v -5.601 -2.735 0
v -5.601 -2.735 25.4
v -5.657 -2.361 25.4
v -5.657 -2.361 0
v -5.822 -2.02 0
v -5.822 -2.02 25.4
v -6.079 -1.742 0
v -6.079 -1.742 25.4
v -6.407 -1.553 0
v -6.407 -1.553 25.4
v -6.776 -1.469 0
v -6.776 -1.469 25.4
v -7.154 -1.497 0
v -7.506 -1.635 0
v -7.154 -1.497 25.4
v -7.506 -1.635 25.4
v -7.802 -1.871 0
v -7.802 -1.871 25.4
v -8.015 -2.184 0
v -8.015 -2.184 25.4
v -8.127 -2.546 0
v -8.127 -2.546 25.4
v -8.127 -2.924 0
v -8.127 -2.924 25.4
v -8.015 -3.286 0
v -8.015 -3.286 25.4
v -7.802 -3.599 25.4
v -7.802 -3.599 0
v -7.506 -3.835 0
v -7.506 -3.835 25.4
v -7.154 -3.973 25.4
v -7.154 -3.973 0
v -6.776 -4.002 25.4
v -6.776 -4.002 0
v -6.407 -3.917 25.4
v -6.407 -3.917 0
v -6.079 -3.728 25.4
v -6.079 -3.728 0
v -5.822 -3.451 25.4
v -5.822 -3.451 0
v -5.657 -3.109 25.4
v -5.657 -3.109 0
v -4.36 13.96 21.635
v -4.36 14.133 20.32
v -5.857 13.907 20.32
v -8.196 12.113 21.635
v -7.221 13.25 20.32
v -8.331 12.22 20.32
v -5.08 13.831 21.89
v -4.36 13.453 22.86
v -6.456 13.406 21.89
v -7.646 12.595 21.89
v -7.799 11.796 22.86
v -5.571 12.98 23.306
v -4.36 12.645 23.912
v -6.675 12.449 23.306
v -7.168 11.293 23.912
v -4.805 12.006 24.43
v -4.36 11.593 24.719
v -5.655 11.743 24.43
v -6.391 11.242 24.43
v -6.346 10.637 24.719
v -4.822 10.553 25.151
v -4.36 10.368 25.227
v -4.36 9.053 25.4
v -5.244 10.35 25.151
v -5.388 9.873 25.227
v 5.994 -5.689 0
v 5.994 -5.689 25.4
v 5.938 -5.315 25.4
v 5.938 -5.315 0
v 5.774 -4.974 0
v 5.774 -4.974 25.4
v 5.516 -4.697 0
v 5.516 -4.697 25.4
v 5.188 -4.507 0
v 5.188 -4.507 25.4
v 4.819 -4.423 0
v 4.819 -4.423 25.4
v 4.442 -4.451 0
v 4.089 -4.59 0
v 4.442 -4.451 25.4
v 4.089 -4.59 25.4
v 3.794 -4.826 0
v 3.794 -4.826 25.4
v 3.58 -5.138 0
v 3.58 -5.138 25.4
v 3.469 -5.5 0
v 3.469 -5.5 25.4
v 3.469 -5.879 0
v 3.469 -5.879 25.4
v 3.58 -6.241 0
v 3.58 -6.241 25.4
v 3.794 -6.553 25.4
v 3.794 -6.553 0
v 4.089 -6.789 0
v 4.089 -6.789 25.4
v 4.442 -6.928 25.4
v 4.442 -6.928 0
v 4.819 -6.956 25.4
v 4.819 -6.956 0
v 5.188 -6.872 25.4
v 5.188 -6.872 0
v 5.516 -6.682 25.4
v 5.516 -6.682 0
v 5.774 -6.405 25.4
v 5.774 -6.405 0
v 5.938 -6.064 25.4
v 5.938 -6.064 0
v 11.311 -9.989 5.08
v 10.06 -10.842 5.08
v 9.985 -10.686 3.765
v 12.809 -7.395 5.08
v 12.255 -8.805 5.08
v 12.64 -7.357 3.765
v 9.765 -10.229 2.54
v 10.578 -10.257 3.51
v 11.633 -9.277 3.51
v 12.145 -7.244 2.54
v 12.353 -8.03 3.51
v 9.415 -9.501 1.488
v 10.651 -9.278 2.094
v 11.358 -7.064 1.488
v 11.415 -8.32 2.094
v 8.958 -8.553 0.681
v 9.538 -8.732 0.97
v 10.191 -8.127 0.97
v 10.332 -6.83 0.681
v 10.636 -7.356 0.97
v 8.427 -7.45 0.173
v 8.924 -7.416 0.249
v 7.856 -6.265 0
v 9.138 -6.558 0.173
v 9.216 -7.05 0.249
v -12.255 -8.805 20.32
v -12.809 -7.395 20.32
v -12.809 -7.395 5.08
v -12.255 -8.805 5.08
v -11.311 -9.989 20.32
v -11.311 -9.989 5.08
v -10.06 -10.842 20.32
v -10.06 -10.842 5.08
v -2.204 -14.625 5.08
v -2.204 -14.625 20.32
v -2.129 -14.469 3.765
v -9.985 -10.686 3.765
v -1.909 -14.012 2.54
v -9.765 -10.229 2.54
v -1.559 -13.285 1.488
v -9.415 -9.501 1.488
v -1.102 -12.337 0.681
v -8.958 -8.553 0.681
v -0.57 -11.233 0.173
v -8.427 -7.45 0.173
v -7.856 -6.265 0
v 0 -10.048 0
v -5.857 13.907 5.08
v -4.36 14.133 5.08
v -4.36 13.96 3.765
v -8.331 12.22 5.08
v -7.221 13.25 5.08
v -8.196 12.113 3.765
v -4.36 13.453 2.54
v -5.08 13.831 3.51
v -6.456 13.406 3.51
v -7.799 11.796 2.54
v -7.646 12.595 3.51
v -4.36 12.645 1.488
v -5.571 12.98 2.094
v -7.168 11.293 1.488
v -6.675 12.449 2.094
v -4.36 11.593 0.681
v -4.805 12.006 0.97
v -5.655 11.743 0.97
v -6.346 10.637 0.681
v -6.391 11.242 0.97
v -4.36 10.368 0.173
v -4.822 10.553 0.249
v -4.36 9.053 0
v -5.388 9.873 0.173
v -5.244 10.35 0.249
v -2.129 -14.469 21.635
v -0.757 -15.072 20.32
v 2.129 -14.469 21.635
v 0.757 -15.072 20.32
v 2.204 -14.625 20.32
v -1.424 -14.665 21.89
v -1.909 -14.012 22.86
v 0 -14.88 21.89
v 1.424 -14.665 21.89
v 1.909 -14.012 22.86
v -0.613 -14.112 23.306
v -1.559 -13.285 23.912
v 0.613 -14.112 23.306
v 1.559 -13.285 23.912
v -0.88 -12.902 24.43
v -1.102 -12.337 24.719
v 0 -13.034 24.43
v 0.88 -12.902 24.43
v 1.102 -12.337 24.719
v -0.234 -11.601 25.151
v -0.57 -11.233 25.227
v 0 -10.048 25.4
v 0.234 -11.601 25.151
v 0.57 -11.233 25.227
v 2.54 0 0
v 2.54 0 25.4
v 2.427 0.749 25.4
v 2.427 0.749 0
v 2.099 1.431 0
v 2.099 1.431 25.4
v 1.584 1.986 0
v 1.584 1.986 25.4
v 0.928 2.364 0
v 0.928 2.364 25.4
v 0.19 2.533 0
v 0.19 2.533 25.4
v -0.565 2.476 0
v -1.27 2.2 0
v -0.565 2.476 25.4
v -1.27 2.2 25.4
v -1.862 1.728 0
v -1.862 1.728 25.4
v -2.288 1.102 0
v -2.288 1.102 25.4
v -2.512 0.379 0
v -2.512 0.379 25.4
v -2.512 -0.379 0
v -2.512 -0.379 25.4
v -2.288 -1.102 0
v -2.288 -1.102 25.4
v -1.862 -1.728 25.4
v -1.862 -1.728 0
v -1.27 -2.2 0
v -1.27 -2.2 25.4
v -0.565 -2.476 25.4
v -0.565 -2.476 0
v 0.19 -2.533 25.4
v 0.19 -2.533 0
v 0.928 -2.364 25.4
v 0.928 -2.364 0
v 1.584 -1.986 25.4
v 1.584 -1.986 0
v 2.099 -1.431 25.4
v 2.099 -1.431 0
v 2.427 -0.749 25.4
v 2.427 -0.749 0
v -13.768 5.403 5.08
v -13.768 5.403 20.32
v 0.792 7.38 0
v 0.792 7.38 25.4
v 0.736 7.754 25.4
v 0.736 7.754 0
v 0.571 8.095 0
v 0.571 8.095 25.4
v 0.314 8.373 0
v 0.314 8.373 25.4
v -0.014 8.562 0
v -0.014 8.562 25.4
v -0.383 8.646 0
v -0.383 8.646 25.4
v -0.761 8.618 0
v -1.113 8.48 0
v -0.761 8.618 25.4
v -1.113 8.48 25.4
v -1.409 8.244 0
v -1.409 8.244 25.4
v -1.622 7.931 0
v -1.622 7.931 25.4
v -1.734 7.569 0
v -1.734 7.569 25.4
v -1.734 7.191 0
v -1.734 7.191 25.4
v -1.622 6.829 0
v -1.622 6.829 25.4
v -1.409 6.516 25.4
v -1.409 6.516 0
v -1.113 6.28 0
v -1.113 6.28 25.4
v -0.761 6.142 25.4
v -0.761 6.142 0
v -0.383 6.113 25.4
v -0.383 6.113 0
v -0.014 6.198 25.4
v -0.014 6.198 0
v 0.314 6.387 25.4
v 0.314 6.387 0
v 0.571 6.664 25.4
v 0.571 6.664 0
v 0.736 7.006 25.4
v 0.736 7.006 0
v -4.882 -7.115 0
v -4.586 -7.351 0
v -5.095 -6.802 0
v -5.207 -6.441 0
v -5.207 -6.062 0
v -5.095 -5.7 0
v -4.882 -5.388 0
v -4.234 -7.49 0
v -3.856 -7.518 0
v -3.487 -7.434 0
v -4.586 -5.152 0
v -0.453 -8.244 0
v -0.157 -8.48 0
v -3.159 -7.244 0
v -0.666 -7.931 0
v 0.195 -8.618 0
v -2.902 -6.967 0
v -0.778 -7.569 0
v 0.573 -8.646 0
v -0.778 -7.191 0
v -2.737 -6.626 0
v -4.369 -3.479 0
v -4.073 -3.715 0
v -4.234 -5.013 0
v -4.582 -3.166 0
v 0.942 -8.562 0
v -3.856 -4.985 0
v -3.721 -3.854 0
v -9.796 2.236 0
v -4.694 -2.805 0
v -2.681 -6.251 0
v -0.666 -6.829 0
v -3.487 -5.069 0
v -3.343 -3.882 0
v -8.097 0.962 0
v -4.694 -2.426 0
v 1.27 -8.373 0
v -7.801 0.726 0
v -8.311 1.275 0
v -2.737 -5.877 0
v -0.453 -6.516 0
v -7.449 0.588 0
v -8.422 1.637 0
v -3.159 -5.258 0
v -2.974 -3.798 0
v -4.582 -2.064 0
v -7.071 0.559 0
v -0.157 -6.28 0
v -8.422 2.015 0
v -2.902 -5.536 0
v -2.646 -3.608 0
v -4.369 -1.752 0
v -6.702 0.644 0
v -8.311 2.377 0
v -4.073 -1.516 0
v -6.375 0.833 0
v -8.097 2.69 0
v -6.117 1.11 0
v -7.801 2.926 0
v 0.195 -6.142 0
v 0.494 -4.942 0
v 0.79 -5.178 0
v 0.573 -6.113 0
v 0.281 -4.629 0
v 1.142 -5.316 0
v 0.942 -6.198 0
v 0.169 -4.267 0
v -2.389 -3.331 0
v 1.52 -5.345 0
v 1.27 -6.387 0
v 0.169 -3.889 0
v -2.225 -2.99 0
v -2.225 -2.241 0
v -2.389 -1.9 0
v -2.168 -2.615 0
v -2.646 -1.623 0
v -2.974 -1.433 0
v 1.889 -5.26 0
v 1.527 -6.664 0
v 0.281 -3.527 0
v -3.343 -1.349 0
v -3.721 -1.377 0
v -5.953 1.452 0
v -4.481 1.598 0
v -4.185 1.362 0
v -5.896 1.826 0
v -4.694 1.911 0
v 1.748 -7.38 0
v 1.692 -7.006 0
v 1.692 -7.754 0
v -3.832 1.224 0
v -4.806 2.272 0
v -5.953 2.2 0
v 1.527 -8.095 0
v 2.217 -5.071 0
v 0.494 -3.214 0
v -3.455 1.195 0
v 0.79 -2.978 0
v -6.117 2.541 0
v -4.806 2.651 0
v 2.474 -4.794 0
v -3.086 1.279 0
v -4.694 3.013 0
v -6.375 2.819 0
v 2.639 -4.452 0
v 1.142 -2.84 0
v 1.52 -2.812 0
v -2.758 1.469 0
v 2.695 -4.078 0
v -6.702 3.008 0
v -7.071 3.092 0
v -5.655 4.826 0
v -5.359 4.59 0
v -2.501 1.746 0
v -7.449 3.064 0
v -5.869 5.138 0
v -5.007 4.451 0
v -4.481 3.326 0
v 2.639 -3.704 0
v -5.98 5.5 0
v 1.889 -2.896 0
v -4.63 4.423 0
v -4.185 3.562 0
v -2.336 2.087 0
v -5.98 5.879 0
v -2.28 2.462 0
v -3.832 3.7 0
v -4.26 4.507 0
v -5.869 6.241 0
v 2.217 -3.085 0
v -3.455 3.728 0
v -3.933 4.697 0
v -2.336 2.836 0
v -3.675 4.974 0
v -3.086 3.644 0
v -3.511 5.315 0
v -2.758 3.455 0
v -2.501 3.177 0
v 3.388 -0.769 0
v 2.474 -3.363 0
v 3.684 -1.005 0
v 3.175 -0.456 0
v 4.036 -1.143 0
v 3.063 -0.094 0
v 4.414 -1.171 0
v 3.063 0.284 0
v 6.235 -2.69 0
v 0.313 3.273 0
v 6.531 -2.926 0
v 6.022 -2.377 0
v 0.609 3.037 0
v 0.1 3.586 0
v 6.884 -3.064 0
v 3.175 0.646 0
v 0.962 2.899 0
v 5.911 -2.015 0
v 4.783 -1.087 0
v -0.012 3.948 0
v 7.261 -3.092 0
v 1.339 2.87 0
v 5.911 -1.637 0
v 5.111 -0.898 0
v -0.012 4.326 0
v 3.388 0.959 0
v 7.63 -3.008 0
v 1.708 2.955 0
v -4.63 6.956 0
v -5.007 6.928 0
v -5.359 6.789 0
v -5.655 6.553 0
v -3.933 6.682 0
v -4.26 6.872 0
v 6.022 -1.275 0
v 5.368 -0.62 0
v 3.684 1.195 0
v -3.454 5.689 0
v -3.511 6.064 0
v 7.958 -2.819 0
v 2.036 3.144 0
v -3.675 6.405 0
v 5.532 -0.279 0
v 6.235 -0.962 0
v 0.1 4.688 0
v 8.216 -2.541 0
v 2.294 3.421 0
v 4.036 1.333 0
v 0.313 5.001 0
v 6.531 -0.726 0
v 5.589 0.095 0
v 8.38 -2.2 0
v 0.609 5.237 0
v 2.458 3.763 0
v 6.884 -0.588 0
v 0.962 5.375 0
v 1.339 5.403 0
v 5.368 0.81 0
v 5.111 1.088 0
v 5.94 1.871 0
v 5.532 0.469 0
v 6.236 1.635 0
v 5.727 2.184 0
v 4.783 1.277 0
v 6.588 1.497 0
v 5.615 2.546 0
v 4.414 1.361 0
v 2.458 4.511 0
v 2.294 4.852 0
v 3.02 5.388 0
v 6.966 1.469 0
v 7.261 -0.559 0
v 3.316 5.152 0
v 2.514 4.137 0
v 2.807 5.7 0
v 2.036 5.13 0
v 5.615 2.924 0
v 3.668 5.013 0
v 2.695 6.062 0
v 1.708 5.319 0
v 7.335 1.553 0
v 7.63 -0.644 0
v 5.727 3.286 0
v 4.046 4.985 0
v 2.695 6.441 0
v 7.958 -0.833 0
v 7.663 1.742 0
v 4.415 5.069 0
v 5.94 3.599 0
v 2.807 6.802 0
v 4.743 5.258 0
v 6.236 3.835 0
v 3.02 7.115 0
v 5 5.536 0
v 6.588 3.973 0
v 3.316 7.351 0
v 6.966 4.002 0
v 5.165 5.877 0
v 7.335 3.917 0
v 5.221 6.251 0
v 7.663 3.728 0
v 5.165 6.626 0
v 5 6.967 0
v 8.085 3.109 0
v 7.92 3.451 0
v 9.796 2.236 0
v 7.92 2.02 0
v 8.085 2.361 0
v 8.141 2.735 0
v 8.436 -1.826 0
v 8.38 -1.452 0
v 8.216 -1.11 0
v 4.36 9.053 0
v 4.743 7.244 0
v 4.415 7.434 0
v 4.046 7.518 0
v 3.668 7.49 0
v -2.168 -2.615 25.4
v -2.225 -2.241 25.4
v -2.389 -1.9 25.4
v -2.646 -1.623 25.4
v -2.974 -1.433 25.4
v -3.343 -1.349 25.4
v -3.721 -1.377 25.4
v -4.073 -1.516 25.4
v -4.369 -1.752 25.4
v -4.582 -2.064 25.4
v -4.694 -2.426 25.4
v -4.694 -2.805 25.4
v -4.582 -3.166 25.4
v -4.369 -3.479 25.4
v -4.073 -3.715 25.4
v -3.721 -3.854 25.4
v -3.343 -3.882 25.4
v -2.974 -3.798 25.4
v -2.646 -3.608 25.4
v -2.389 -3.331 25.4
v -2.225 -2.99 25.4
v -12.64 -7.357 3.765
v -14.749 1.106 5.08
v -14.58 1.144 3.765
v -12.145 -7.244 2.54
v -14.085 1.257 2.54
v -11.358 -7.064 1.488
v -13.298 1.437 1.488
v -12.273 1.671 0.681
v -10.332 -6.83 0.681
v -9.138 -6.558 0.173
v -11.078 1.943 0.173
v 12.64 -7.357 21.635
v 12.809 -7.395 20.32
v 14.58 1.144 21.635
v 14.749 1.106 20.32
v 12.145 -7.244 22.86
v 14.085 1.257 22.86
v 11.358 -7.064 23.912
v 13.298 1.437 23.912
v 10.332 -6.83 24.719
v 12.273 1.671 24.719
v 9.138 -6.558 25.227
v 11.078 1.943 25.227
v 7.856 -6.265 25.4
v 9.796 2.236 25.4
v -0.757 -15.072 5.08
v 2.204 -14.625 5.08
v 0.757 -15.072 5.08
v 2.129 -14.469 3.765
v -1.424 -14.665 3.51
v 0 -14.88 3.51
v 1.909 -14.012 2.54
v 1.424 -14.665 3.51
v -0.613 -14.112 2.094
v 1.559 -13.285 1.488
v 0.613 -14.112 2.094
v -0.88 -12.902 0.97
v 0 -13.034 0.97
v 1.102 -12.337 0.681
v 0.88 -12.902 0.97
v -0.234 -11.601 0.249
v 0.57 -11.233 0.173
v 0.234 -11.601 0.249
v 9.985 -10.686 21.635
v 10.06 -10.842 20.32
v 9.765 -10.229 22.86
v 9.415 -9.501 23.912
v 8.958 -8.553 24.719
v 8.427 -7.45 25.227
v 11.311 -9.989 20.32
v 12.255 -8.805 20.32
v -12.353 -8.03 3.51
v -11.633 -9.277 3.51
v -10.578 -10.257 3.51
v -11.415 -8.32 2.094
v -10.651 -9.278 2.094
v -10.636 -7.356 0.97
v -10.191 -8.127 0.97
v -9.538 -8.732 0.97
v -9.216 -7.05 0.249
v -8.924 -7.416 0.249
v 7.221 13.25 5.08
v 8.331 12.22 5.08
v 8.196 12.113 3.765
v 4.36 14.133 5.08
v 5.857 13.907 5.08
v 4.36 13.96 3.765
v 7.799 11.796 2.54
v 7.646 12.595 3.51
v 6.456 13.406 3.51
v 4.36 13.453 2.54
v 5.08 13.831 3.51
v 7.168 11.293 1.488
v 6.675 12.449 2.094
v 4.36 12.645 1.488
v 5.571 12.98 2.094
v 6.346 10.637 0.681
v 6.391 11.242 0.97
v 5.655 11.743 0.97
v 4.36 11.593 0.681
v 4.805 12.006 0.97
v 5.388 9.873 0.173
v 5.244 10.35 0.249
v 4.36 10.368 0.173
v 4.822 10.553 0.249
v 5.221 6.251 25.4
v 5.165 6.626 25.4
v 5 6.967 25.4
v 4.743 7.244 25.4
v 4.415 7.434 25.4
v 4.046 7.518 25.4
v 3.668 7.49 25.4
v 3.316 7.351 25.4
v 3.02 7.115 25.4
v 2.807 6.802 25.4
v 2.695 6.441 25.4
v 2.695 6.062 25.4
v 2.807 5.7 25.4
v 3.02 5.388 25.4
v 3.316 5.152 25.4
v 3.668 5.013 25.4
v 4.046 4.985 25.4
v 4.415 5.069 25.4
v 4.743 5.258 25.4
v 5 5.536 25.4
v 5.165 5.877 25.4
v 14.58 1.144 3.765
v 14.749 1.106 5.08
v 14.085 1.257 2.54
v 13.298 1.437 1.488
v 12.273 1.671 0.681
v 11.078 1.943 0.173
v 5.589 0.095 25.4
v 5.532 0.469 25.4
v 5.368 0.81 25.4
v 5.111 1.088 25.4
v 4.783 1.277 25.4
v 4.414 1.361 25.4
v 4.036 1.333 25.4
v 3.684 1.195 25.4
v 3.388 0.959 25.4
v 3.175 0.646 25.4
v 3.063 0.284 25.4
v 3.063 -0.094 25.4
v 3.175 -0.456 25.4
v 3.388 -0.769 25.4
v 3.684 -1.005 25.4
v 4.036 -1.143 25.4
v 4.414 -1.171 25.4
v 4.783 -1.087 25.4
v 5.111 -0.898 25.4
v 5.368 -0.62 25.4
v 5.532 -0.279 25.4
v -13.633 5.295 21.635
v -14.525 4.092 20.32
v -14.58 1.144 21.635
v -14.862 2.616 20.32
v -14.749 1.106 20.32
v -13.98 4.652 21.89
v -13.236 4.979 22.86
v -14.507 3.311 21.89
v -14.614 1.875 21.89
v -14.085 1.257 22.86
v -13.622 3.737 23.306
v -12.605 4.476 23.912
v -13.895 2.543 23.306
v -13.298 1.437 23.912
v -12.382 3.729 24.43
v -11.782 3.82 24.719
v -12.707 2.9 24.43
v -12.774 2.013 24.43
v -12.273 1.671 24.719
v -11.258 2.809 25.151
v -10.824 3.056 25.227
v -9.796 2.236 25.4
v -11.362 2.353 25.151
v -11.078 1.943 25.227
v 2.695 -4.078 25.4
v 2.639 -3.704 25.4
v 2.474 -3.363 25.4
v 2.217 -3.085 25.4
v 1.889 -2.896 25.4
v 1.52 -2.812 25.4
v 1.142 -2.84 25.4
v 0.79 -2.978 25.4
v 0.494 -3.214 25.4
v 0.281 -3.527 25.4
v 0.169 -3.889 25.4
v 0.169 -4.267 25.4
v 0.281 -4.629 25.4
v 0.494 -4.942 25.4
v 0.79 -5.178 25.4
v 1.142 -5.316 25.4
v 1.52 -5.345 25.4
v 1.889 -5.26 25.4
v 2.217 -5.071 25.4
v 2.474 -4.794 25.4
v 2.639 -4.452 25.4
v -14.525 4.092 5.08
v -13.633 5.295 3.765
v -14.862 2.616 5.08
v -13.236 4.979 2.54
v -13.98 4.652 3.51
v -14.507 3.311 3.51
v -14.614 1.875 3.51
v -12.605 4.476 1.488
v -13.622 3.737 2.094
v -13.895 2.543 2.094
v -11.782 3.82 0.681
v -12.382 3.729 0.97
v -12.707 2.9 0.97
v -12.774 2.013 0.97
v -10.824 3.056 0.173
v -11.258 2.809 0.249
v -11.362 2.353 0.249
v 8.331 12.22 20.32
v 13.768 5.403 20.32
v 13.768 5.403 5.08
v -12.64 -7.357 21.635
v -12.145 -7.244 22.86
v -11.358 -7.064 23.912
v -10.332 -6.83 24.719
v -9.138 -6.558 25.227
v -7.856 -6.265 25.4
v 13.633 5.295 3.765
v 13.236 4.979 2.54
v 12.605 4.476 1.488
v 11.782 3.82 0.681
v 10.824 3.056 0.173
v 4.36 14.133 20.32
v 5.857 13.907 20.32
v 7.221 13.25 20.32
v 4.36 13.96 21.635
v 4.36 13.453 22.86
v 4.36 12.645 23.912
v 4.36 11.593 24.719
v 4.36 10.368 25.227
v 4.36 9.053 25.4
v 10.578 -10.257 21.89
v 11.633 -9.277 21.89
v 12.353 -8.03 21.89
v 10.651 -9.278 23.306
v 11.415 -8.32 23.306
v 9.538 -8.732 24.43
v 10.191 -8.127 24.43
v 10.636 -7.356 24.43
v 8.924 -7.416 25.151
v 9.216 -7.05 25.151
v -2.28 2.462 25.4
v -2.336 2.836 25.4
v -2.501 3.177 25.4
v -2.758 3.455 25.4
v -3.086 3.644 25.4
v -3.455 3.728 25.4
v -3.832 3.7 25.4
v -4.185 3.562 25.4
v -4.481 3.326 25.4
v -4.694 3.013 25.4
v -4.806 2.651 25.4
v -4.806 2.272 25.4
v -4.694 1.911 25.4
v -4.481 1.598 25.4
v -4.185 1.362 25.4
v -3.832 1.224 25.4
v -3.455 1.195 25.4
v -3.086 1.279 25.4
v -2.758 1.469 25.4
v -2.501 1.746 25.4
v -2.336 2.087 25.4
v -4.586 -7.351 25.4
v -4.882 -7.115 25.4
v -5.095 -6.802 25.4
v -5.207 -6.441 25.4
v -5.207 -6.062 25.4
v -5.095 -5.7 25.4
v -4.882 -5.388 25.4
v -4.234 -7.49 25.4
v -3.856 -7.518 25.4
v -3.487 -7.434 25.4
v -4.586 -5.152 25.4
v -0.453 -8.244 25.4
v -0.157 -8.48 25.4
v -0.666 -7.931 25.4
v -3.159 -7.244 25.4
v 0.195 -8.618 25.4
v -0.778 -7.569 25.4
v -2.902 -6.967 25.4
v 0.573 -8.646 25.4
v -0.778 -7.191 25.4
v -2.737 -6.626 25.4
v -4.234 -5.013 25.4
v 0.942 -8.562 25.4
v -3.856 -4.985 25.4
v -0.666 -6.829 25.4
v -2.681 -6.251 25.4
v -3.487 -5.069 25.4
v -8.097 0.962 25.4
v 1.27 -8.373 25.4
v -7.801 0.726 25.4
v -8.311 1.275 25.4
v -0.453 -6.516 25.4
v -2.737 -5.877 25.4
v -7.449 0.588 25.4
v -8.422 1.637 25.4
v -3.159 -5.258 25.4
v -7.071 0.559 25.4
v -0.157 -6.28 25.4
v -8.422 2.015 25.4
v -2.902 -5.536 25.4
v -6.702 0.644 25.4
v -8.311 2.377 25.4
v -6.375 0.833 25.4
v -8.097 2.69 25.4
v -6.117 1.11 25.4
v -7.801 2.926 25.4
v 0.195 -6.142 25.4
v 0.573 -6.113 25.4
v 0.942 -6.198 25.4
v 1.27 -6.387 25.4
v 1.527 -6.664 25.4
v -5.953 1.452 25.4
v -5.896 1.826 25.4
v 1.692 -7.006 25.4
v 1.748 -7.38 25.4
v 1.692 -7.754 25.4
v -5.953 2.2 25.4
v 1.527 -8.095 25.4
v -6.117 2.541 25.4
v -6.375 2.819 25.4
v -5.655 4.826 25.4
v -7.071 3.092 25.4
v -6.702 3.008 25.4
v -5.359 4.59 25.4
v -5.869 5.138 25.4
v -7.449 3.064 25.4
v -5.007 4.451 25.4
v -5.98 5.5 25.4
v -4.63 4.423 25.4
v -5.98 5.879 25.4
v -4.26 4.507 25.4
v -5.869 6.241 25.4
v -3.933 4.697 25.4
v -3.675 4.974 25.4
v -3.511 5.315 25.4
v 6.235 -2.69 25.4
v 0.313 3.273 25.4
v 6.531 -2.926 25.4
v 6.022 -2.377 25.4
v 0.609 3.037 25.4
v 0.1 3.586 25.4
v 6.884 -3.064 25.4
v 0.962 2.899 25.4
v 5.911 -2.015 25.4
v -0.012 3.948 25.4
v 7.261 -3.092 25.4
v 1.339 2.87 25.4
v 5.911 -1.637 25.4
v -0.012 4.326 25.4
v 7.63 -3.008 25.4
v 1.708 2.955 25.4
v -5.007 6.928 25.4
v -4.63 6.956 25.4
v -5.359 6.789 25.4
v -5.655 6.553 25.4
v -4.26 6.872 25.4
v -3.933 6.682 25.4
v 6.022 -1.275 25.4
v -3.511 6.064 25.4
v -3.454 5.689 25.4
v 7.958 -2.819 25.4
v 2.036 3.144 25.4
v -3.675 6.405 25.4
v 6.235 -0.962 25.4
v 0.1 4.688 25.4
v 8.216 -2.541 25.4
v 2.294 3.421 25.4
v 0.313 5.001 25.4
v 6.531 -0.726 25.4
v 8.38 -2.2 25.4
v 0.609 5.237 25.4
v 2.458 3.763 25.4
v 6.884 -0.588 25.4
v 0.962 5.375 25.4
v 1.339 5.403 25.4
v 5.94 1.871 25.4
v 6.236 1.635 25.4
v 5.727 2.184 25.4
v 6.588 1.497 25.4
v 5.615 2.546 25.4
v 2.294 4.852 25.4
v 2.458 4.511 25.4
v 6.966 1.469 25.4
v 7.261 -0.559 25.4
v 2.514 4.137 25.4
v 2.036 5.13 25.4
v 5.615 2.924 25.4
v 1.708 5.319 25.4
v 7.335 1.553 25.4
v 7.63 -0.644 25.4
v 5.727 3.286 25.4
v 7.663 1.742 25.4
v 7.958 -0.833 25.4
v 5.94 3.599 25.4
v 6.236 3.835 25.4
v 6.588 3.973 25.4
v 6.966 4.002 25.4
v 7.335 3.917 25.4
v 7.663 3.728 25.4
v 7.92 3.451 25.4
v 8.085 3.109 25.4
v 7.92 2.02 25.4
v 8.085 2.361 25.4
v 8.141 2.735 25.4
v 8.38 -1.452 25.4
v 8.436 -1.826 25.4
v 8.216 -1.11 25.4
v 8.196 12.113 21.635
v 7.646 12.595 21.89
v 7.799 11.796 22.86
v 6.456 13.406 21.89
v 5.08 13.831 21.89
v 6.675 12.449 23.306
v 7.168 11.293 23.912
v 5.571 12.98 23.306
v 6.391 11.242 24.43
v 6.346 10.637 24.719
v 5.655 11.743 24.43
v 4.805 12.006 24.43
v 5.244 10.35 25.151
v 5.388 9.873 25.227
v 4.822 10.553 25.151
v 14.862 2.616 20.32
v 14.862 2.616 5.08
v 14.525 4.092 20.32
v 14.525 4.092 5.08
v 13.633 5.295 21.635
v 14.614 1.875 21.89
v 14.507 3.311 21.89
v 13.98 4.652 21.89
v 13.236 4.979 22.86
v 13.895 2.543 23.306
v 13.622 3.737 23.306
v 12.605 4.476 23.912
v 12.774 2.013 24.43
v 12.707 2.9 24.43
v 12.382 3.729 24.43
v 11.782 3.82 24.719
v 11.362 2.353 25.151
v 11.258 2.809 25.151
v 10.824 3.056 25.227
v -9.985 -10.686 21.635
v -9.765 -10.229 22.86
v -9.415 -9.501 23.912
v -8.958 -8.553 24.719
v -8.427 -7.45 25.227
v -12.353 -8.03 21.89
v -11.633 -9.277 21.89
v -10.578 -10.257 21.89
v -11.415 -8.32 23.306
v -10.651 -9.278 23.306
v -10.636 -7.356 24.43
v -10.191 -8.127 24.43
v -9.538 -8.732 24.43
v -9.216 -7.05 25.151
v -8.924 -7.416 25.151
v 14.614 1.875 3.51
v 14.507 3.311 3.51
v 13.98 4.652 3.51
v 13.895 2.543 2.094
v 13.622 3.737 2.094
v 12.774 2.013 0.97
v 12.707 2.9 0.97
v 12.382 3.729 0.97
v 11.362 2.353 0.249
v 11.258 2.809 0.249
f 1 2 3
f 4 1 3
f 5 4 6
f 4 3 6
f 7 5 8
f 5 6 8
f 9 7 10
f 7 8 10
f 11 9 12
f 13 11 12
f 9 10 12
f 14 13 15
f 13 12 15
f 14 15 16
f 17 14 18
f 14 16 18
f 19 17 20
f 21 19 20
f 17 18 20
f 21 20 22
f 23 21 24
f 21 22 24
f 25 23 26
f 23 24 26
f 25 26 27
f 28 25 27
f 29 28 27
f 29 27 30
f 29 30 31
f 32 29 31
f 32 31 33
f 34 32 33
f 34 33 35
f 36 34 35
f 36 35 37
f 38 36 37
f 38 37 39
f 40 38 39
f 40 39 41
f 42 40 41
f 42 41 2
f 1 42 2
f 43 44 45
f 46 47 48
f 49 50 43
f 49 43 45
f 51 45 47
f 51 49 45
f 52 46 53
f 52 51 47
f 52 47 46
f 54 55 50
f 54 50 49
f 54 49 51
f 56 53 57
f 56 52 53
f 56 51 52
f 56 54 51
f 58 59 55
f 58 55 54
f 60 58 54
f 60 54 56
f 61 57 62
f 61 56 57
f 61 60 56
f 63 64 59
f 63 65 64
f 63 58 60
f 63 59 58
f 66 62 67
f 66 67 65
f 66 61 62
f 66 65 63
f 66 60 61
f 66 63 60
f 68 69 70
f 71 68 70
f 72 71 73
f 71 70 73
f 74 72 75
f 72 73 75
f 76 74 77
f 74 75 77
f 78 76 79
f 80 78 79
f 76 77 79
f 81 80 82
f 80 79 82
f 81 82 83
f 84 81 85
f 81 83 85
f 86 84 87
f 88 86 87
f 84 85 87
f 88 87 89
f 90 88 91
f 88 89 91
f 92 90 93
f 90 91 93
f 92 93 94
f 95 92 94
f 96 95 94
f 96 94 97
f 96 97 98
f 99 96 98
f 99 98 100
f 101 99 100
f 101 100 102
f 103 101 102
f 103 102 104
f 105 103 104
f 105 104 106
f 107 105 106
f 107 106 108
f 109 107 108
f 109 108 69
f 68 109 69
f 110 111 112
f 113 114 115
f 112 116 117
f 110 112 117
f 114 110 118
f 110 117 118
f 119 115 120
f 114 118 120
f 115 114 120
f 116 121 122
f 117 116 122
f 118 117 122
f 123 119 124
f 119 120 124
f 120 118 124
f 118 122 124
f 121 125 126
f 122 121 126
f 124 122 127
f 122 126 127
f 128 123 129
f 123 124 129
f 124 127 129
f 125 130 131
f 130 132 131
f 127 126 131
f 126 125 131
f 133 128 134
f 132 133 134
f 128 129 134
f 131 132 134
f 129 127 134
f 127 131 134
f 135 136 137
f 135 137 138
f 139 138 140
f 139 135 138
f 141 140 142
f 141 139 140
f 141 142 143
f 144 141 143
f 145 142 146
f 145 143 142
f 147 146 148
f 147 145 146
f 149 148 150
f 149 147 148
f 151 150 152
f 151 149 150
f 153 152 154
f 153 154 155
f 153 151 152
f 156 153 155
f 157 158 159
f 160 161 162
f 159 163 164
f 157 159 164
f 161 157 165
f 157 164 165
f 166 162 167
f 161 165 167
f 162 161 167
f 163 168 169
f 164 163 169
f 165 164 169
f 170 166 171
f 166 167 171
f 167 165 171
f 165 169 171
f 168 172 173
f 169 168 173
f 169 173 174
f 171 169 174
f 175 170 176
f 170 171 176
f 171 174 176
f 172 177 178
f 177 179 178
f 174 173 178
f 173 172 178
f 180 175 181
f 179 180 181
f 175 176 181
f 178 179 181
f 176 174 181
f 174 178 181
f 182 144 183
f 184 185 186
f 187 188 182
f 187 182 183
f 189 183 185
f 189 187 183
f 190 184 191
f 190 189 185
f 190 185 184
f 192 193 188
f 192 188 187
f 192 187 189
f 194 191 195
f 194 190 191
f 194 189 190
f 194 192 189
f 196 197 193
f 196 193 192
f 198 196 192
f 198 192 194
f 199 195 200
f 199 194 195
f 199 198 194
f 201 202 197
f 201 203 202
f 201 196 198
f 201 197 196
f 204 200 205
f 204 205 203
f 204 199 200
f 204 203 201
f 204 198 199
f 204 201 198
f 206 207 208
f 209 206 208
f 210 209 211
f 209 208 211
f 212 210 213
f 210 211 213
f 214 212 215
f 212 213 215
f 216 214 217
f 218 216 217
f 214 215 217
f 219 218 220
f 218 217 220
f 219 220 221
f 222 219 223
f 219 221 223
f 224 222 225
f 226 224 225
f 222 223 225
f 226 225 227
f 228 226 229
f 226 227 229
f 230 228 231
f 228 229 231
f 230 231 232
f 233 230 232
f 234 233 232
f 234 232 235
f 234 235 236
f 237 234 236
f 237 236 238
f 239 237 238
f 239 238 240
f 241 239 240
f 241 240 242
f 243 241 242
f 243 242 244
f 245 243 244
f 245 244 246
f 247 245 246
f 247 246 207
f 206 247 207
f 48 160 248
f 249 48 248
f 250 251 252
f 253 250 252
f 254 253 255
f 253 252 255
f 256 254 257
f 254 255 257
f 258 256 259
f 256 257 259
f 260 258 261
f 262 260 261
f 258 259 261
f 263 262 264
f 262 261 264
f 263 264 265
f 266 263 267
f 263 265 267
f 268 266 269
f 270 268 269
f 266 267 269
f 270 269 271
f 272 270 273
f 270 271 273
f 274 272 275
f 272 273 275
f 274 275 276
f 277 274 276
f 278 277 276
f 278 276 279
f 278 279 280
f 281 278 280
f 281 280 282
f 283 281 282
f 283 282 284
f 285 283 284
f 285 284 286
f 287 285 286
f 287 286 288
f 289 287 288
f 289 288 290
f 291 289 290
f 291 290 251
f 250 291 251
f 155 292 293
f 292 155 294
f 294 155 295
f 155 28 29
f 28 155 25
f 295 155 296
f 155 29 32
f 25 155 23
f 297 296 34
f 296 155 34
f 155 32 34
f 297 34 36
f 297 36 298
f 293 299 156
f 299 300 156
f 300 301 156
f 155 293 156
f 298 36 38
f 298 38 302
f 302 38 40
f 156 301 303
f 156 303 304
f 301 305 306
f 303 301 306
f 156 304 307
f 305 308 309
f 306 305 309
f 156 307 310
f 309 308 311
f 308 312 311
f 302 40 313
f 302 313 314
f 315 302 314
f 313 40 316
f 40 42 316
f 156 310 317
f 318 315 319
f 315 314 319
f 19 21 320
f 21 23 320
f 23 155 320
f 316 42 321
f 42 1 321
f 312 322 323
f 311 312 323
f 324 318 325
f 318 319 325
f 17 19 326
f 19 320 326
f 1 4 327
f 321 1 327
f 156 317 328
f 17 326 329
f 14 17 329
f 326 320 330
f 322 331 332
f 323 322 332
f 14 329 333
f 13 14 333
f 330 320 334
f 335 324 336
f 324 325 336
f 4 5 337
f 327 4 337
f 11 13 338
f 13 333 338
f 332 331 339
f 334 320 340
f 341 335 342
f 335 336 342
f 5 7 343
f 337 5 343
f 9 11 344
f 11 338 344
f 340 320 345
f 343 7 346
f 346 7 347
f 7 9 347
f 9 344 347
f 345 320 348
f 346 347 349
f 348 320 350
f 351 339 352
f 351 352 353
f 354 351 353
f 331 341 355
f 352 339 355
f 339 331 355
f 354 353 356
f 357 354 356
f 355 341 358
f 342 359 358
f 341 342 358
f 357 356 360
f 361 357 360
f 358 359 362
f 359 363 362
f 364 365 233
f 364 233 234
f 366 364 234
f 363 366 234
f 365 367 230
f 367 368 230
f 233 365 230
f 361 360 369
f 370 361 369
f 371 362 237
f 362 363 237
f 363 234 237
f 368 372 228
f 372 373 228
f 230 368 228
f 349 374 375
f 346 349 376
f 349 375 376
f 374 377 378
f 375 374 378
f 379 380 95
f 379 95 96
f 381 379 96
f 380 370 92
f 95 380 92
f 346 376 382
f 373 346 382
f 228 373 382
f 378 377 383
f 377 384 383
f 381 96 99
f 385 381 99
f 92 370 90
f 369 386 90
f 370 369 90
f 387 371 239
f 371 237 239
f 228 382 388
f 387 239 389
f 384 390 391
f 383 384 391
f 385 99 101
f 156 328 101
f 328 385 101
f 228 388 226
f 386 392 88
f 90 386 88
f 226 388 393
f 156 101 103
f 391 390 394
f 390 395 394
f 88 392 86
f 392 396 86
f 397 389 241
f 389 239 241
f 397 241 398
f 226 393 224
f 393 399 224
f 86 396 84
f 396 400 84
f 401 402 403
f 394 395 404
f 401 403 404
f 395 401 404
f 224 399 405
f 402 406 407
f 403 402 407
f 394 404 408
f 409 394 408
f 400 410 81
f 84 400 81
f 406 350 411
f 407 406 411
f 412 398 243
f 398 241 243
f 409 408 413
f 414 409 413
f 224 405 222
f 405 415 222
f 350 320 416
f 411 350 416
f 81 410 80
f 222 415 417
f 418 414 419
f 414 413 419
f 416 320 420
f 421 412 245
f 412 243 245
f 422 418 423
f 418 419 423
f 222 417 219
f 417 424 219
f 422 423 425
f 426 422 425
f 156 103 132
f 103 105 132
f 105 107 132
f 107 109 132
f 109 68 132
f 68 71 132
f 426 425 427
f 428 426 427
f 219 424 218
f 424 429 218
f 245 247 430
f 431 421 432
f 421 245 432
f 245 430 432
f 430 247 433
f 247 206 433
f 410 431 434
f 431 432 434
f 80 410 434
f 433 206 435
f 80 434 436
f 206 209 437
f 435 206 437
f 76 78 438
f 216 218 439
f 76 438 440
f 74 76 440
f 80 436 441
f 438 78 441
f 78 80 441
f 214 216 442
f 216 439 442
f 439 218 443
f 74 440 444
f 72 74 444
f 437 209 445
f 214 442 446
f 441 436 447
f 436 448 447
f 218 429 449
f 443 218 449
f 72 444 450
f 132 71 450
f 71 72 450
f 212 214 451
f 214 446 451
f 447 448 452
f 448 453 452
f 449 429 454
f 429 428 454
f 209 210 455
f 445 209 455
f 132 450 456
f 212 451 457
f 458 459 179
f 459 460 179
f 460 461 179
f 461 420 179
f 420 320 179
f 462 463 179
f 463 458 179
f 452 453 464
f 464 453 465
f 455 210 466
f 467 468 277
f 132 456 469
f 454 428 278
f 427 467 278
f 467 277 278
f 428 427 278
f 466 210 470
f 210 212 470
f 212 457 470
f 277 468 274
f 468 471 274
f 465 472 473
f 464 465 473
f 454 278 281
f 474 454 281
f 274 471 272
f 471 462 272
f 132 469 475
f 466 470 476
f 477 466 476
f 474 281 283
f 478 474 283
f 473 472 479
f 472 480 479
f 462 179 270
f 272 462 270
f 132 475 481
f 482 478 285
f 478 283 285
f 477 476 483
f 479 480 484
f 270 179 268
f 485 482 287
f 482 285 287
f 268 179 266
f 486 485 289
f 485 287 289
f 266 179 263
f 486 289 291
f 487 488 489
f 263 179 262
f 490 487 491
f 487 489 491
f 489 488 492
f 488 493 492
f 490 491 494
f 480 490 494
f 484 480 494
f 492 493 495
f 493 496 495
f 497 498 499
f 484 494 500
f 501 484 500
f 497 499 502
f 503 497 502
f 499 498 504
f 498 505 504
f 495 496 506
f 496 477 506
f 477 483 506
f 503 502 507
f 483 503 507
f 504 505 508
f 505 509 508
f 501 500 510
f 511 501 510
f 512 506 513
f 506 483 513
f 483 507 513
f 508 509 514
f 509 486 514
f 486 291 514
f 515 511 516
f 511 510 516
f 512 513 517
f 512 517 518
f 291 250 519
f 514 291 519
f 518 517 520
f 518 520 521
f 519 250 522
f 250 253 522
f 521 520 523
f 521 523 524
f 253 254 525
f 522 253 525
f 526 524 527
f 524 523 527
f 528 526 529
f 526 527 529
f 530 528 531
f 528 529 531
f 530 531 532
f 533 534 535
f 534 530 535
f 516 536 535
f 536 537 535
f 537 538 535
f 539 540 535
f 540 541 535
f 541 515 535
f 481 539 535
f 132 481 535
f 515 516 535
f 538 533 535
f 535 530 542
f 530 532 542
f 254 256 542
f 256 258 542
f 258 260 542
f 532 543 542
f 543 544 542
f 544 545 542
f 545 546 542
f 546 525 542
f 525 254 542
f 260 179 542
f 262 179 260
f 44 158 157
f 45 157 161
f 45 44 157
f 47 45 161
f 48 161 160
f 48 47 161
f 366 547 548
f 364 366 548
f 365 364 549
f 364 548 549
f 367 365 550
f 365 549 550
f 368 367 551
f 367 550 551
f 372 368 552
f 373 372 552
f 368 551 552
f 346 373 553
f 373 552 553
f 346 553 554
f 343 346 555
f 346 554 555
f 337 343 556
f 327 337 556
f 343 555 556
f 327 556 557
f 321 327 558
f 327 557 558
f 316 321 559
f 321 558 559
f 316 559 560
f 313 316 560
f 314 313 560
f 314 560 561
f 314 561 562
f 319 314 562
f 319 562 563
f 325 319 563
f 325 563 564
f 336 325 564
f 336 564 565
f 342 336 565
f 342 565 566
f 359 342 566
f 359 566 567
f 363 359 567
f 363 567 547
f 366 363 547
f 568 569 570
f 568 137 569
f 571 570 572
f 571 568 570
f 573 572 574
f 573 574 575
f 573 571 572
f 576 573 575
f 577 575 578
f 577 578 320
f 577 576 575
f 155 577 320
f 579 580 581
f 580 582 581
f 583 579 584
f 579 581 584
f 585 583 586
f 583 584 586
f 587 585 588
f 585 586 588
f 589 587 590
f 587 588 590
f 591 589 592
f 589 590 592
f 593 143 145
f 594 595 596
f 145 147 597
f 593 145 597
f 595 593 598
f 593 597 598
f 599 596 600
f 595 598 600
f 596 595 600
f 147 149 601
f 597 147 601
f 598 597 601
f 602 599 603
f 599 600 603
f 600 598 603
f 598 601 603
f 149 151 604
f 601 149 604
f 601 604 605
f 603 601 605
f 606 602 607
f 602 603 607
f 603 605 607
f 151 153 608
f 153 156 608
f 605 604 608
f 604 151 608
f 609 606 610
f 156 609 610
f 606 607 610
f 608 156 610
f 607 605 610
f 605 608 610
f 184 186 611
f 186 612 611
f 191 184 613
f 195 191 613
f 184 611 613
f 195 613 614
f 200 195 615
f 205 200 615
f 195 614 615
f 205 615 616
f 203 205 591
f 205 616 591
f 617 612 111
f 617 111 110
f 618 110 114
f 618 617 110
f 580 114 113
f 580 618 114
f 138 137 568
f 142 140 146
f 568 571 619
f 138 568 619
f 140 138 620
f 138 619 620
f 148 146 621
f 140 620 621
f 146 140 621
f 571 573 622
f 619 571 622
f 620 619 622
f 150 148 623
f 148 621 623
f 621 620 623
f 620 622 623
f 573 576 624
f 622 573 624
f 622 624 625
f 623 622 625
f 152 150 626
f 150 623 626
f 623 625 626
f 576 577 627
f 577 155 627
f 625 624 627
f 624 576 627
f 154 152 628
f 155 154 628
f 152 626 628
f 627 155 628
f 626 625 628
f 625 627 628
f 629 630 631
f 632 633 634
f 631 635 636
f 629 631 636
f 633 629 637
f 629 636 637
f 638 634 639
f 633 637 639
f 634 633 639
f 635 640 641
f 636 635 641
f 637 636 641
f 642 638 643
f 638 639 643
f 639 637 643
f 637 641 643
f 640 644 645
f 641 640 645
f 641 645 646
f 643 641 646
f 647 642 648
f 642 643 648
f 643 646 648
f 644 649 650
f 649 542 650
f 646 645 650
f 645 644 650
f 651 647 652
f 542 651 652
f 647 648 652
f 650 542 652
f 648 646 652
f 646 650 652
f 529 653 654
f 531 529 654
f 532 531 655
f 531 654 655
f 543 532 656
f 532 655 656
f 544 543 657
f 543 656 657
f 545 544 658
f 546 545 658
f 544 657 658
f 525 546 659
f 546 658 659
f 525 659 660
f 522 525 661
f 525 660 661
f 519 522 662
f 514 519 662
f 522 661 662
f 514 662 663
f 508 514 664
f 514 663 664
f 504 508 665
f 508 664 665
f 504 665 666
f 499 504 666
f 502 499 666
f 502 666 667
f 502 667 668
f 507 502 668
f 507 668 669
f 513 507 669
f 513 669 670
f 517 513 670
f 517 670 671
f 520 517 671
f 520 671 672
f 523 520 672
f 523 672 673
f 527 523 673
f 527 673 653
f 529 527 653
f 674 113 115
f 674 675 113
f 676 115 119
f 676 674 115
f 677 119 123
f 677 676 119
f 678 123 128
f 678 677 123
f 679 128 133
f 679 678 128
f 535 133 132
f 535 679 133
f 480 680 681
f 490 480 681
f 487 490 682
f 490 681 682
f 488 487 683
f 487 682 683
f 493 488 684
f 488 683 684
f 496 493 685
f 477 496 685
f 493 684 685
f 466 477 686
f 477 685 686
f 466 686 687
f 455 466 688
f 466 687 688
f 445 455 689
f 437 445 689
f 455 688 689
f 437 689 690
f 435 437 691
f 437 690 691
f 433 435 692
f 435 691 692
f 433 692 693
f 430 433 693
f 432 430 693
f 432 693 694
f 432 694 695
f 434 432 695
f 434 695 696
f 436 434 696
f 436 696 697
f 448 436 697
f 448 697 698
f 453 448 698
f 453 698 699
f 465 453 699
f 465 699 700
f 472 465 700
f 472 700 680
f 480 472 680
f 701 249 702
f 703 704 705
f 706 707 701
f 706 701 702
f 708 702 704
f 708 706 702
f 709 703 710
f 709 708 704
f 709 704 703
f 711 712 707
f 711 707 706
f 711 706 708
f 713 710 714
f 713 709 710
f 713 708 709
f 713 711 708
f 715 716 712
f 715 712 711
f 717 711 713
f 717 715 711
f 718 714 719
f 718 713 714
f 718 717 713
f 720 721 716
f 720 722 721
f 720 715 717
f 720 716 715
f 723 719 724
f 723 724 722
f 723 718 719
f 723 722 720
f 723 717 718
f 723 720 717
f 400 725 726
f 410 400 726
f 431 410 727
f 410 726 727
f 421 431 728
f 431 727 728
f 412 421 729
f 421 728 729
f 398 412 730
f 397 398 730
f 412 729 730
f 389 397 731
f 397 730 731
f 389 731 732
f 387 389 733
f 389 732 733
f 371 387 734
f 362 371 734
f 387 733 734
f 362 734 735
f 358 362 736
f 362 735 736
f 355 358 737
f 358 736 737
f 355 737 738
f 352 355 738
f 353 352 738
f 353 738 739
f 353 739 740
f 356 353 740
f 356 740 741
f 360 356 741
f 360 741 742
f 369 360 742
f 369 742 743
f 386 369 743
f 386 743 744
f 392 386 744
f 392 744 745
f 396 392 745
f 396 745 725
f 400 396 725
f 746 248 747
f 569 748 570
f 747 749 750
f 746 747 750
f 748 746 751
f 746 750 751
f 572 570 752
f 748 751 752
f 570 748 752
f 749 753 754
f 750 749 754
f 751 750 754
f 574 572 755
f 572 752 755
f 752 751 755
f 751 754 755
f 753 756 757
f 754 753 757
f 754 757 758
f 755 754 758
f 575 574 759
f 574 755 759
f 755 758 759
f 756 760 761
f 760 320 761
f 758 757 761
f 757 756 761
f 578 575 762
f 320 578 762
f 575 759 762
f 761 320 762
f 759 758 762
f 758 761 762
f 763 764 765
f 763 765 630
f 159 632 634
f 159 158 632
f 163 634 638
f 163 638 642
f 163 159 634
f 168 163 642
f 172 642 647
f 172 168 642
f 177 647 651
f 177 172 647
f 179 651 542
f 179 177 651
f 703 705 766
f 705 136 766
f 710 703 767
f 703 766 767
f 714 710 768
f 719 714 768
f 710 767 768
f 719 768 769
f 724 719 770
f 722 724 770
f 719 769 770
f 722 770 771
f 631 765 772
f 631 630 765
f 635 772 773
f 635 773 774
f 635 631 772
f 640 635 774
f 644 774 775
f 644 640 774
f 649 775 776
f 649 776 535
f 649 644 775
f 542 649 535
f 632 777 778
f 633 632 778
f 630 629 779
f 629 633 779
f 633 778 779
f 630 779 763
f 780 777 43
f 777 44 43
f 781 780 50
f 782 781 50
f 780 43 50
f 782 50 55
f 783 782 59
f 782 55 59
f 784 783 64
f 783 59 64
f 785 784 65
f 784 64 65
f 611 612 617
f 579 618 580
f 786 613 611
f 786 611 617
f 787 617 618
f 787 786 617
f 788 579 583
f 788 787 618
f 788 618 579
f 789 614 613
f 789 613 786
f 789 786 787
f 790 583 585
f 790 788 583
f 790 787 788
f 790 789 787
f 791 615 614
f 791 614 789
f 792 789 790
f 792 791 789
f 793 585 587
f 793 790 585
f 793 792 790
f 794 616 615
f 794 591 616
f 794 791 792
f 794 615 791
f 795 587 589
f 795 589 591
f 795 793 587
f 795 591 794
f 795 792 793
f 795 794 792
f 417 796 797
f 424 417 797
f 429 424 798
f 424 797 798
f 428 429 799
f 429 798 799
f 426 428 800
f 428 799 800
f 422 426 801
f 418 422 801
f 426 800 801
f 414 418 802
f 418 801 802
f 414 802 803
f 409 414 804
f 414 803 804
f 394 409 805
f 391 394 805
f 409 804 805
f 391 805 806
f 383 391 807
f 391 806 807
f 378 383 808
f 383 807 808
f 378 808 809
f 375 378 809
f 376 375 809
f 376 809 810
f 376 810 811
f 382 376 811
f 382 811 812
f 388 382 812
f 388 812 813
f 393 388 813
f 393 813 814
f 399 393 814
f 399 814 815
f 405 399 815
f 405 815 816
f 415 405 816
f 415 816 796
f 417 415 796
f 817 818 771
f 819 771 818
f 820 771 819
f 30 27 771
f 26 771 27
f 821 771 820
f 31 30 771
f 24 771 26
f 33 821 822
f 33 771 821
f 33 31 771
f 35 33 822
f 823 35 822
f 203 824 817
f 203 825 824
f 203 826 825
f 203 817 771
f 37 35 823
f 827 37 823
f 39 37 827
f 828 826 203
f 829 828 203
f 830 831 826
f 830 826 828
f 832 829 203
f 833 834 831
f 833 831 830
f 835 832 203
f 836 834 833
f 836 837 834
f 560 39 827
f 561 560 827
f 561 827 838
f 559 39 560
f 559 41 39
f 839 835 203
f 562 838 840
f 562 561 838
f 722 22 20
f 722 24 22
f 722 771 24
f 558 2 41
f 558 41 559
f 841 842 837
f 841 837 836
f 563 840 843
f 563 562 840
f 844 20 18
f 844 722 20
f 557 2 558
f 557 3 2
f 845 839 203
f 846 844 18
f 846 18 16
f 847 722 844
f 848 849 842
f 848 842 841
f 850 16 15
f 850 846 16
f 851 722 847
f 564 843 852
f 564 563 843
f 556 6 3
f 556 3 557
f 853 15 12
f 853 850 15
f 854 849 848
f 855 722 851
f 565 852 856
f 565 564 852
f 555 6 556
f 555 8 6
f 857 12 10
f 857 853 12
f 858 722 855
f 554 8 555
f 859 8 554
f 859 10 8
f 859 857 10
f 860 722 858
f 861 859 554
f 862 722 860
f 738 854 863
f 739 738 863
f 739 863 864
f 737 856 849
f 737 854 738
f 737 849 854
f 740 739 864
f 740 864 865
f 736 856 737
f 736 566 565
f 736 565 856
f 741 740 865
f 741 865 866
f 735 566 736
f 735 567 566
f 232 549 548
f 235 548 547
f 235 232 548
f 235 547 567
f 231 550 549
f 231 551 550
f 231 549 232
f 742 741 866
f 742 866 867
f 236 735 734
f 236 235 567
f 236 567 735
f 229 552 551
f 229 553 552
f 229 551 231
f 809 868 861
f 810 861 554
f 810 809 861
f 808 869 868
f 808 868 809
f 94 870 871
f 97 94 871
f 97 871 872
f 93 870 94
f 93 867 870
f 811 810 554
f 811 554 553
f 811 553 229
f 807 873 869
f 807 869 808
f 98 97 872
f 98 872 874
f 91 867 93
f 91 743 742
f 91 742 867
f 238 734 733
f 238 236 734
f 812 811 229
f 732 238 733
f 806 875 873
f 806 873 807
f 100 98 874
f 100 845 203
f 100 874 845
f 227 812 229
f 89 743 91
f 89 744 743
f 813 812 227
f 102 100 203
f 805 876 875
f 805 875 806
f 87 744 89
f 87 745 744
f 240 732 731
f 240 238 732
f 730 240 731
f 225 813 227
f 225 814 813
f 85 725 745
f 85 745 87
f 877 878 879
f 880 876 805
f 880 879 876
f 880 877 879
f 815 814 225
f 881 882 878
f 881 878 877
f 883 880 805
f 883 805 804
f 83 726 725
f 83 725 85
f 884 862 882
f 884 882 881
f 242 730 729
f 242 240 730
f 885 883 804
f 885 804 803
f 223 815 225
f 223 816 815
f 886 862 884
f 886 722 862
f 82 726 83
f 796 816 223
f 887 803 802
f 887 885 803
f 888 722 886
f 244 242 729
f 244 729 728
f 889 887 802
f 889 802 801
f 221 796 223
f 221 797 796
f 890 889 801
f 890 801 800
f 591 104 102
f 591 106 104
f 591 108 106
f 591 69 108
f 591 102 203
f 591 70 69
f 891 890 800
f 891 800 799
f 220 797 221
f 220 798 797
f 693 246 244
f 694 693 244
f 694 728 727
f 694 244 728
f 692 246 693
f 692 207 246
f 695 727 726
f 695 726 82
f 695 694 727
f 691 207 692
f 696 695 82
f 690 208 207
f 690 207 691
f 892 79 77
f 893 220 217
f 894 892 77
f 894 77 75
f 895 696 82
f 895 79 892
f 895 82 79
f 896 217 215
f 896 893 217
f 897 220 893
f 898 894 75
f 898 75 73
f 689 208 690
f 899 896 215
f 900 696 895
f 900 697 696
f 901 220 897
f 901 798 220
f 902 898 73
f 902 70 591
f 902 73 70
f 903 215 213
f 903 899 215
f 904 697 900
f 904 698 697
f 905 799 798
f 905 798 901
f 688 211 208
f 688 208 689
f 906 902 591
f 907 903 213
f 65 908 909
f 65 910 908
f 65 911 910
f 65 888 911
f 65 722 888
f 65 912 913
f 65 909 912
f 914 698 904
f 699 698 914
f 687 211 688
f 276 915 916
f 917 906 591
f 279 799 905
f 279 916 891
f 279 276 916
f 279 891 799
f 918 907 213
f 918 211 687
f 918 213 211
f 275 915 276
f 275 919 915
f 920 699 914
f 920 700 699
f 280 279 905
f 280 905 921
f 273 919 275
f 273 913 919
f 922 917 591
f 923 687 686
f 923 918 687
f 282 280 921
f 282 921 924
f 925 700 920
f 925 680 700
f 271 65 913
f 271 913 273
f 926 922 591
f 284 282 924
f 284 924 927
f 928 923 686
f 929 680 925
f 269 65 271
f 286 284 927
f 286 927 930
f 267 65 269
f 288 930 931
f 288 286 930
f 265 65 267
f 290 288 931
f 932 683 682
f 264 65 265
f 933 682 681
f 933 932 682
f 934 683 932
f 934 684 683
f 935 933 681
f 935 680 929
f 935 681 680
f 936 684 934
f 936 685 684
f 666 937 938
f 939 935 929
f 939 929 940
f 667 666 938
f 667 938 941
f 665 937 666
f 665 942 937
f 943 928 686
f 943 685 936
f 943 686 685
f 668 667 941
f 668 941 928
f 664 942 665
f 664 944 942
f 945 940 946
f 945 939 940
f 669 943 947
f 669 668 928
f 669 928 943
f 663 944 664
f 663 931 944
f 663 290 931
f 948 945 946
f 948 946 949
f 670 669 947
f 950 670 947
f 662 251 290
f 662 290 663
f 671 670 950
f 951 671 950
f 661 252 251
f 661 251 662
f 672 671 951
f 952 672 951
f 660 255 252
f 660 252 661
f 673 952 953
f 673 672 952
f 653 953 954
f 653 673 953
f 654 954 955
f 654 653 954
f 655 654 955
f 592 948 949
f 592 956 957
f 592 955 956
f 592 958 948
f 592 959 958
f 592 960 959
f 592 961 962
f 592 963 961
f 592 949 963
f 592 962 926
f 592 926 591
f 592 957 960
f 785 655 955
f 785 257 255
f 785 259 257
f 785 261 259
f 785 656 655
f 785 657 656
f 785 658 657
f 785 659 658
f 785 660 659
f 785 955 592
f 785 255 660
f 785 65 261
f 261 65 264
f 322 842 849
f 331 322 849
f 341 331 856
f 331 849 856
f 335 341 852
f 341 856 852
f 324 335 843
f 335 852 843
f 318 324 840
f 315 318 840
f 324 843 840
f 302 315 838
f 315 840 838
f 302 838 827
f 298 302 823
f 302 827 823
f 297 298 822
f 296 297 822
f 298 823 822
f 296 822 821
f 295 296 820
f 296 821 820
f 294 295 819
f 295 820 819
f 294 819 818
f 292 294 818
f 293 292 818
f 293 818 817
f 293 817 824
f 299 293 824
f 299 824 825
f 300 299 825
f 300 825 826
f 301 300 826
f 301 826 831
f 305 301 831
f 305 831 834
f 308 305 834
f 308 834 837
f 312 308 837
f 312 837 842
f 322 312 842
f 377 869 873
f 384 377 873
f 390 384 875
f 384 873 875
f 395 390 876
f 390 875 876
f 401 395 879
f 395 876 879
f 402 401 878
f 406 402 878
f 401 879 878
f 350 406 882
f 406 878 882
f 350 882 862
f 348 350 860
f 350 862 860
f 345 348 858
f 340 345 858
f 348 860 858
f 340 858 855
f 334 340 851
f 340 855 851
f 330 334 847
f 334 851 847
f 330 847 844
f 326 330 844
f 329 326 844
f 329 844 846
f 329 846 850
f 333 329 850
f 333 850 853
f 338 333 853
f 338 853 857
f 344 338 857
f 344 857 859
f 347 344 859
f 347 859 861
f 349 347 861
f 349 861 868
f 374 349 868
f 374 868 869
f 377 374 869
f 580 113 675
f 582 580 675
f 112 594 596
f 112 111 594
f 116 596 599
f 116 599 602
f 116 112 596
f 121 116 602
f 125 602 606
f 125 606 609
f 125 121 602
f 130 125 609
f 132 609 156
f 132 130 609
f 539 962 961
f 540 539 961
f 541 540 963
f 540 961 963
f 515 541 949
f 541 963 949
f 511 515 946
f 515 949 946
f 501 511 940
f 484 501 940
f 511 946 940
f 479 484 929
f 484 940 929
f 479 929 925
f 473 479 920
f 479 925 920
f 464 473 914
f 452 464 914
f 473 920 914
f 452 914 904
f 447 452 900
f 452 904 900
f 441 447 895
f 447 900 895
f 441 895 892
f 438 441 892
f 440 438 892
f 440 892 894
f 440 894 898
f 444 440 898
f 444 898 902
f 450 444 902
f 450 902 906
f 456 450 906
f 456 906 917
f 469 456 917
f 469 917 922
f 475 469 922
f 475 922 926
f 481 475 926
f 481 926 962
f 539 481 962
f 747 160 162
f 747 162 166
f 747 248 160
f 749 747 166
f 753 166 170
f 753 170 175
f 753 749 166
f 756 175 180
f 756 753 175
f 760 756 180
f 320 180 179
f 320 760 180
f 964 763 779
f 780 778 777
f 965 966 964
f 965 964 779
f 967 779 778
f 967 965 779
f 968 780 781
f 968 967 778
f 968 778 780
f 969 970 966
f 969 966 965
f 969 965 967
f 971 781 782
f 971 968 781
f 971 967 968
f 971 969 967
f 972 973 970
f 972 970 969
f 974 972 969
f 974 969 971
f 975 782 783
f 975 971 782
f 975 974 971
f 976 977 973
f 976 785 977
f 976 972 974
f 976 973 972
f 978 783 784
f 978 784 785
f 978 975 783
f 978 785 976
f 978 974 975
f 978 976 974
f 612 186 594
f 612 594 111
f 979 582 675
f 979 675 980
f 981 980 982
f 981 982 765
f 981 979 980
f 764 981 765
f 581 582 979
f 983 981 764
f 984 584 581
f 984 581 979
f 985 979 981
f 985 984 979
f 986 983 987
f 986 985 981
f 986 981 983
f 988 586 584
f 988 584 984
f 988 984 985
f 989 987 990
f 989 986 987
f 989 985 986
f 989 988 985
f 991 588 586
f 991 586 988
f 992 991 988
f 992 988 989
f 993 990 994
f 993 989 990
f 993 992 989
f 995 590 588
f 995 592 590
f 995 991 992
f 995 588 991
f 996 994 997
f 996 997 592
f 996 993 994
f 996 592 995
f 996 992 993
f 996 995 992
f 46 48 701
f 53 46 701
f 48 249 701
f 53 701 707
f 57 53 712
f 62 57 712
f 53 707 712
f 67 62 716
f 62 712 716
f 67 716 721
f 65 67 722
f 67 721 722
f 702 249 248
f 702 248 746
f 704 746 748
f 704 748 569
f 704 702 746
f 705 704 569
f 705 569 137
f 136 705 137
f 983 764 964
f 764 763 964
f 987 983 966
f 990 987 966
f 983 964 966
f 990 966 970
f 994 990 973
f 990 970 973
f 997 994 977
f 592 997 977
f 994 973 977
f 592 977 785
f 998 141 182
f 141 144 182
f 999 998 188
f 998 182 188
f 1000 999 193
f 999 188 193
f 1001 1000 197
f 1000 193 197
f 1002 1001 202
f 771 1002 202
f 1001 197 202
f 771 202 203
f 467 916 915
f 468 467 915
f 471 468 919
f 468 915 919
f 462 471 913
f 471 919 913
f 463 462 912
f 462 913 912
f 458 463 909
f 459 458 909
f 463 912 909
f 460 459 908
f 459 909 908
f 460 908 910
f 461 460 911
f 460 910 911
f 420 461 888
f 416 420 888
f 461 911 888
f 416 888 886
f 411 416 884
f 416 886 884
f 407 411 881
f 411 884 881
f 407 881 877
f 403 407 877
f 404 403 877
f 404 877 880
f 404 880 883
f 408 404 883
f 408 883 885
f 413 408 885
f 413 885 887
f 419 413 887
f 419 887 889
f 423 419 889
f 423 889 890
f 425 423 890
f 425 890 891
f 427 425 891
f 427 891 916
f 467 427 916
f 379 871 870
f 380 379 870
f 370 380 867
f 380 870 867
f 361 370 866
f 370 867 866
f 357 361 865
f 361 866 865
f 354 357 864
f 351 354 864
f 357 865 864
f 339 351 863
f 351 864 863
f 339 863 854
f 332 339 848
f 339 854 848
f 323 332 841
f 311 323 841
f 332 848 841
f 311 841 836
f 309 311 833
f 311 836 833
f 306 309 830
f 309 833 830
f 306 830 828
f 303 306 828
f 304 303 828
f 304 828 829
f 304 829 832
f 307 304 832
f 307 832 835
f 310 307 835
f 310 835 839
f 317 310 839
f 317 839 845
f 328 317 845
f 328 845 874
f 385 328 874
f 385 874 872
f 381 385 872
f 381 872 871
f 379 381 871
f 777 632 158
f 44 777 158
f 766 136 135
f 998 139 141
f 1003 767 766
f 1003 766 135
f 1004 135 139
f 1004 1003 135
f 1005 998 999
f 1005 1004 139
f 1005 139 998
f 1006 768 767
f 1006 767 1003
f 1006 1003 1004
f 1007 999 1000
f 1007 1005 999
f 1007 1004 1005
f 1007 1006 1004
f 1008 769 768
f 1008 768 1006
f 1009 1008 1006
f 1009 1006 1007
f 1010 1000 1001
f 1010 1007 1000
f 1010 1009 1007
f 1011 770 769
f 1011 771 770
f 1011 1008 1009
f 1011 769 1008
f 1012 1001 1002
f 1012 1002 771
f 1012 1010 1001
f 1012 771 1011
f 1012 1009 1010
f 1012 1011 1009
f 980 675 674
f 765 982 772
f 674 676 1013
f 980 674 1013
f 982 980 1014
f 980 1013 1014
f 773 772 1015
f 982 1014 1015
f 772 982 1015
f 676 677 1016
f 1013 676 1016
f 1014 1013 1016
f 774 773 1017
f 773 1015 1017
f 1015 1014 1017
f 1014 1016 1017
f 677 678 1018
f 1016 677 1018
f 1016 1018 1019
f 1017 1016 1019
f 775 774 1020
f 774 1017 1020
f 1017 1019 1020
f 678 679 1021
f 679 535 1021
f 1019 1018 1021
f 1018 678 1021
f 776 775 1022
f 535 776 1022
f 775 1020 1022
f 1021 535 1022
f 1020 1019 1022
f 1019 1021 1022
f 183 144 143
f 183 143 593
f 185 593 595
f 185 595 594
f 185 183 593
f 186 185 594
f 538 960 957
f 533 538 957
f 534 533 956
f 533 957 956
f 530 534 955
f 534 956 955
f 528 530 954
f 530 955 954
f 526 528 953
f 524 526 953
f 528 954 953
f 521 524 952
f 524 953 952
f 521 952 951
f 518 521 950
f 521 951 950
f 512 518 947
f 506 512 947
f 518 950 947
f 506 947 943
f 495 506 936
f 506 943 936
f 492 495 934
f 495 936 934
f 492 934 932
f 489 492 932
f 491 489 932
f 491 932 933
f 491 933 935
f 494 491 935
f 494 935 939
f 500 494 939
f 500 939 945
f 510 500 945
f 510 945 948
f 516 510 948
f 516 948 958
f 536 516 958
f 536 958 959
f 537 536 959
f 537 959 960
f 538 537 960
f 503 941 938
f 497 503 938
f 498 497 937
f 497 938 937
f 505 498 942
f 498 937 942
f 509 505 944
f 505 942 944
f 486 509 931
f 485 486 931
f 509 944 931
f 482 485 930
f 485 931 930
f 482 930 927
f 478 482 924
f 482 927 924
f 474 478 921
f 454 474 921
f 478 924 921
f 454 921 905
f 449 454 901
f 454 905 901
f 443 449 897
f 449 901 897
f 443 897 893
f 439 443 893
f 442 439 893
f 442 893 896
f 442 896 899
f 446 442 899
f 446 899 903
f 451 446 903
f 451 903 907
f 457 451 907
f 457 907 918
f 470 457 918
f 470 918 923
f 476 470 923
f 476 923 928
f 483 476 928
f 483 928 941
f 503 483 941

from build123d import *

# Parameters (mm, degrees)
F1_DEPTH = 25.4
F2_R     = 5.08
F3_R     = 5.08
F4_R     = 1.27
F4_R_2   = 2.54
F5_DEPTH = 37.084


with BuildPart() as f1:
    # F0 (on Top) → F1 (new body)
    with BuildSketch(Plane.XY):
        Polygon((6.806168, 14.133153), (-6.806168, 14.133153), (-15.29332, 3.4906), (-12.26429, -9.780445), (0, -15.686616), (12.26429, -9.780445), (15.29332, 3.4906), align=None)
    extrude(amount=F1_DEPTH)

    # F2
    f2_edges = [f1.edges().sort_by_distance(p)[0] for p in [
        (-12.26429, -9.780445, 12.7),
        (-15.29332, 3.4906, 12.7),
        (-6.806168, 14.133153, 12.7),
        (6.806168, 14.133153, 12.7),
        (15.29332, 3.4906, 12.7),
        (12.26429, -9.780445, 12.7),
        (0, -15.686616, 12.7),
    ]]
    fillet(f2_edges, radius=F2_R)

    # F3
    f3_edges = [f1.edges().sort_by_distance(p)[0] for p in [
        (0, 14.133153, 0),
        (0, 14.133153, 25.4),
        (6.563898, 13.630074, 25.4),
        (-6.563898, 13.630074, 25.4),
        (11.049744, 8.811876, 25.4),
        (-11.049744, 8.811876, 25.4),
        (14.748945, 3.36635, 25.4),
        (-14.748945, 3.36635, 25.4),
        (13.778805, -3.144922, 25.4),
        (-13.778805, -3.144922, 25.4),
        (11.827735, -9.432304, 25.4),
        (-11.827735, -9.432304, 25.4),
        (6.132145, -12.73353, 25.4),
        (-6.132145, -12.73353, 25.4),
        (0, -15.128241, 25.4),
    ]]
    fillet(f3_edges, radius=F3_R)

    # F4 (on face) → F5 (cut)
    with BuildSketch(Plane.XY.offset(25.4)):
        with Locations((0.477998, -7.379863)):
            Circle(F4_R)
        with Locations((-3.438198, -2.615431)):
            Circle(F4_R)
        with Locations((4.724483, -5.689474)):
            Circle(F4_R)
        with Locations((7.166376, -1.8259)):
            Circle(F4_R)
        with Locations((4.318873, 0.095006)):
            Circle(F4_R)
        with Locations((6.870957, 2.735106)):
            Circle(F4_R)
        with Locations((3.951066, 6.251395)):
            Circle(F4_R)
        with Locations((1.244249, 4.136851)):
            Circle(F4_R)
        Circle(F4_R_2)
        with Locations((1.424961, -4.078133)):
            Circle(F4_R)
        with Locations((-3.951066, -6.251395)):
            Circle(F4_R)
        with Locations((-6.870957, -2.735106)):
            Circle(F4_R)
        with Locations((-7.166376, 1.8259)):
            Circle(F4_R)
        with Locations((-3.549885, 2.461708)):
            Circle(F4_R)
        with Locations((-4.724483, 5.689474)):
            Circle(F4_R)
        with Locations((-0.477998, 7.379863)):
            Circle(F4_R)
    extrude(amount=-F5_DEPTH, mode=Mode.SUBTRACT)


solid = f1.part
